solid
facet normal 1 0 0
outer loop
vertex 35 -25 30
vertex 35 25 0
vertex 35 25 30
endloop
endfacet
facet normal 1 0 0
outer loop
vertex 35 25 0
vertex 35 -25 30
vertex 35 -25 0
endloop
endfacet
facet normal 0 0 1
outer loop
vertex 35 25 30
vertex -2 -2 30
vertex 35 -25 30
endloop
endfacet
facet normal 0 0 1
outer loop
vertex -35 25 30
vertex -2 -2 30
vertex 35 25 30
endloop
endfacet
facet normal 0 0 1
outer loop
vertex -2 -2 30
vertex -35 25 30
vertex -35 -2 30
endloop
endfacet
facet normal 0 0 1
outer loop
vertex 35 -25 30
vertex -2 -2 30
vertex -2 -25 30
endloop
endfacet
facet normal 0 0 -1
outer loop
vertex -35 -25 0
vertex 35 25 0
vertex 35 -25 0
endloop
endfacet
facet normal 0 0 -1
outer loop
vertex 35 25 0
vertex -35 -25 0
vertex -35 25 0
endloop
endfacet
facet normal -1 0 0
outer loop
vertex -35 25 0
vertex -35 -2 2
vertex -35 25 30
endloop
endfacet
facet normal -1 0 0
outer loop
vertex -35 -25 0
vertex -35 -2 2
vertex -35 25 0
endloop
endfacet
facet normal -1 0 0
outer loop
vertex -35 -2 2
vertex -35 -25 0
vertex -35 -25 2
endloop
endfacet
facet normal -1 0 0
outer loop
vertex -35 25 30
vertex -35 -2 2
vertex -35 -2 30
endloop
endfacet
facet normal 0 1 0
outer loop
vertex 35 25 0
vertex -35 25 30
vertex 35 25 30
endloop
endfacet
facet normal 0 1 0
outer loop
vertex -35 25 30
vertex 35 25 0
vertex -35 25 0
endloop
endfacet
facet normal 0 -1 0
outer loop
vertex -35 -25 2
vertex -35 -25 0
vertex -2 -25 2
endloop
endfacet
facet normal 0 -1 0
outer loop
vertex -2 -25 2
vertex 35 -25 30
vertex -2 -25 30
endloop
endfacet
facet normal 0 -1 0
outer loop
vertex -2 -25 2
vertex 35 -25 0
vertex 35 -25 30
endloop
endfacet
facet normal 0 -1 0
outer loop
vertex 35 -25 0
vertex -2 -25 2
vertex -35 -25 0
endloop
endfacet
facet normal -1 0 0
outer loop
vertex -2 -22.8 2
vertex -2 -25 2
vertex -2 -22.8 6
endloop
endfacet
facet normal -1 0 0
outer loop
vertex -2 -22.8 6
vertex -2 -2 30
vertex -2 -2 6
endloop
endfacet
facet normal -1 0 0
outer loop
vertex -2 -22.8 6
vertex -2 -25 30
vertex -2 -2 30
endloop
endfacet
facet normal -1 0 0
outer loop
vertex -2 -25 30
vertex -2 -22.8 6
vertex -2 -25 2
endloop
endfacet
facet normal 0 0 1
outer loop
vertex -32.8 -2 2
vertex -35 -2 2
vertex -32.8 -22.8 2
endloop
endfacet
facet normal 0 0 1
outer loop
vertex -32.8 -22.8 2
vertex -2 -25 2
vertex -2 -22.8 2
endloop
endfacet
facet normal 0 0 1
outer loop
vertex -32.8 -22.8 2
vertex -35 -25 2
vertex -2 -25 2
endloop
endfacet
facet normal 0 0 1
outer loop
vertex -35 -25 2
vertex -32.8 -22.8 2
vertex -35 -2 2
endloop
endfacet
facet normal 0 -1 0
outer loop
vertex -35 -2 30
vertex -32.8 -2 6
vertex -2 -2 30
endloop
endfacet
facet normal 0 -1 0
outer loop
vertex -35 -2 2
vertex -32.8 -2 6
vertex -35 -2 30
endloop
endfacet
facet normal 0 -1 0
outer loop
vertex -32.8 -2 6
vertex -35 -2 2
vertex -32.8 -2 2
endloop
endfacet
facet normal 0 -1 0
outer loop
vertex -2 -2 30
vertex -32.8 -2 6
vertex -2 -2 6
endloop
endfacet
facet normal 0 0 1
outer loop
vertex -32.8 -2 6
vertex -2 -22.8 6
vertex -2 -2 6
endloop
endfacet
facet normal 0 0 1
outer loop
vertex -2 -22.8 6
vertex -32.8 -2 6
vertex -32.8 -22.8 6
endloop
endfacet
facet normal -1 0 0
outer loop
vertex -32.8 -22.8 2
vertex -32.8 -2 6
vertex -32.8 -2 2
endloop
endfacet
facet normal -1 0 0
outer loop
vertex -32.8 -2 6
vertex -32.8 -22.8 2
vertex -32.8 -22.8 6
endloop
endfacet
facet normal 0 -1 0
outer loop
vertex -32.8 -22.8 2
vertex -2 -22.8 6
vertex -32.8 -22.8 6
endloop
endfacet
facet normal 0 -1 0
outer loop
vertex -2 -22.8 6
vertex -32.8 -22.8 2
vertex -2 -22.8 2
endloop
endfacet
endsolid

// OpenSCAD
// Two-part enclosure for small electronics board (e.g. Arduino-based temperature logger)
// Print orientation: box standing on bed, lid plate flat on bed, lip pointing up (+Z)
// Units: mm

// ---------------- Parameters ----------------
box_x      = 70;    // box outer length (X)
box_y      = 50;    // box outer width (Y)
box_z      = 30;    // box outer height (Z)
box_wall   = 2;     // box wall thickness (sides and floor)

lip_t      = 1.5;   // lid lip thickness (X direction)
lip_h      = 4;     // lid lip height (Z)
lip_o_x    = 65.6;  // lid lip outer length (X)
lip_o_y    = 45.6;  // lid lip outer width (Y)

eps        = 0.5;   // cutter overshoot past faces

$fn = 64;

// ---------------- Derived ----------------
box_inner_x = box_x - 2 * box_wall;   // 66
box_inner_y = box_y - 2 * box_wall;   // 46
box_floor_t = box_wall;               // 2

lip_mag_x   = lip_o_x + 2 * lip_t;     // 68.6
lip_mag_y   = lip_o_y + 2 * lip_t;     // 49.6

// ---------------- Model ----------------
union() {
    // Part 1: Box (open top)
    translate([-box_x / 2, -box_y / 2, 0])
        difference() {
            cube([box_x, box_y, box_z]);
            translate([-box_inner_x / 2, -box_inner_y / 2, box_floor_t])
                cube([box_inner_x, box_inner_y, box_z - box_floor_t + eps]); // open-top cavity
        }

    // Part 2: Lid (plate + rectangular lip), centred on origin in XY, placed on +X side of box
    translate([0, 0, 0])
        union() {
            // Base plate, 70 x 50, lying on the bed
            translate([-box_x / 2, -box_y / 2, 0])
                cube([box_x, box_y, 2]);

            // Lip: wall of thickness lip_t, height lip_h, outer size lip_o_x x lip_o_y
            translate([-lip_o_x / 2, -lip_o_y / 2, 2])
                cube([lip_o_x, lip_o_y, lip_h]);
        }
}
